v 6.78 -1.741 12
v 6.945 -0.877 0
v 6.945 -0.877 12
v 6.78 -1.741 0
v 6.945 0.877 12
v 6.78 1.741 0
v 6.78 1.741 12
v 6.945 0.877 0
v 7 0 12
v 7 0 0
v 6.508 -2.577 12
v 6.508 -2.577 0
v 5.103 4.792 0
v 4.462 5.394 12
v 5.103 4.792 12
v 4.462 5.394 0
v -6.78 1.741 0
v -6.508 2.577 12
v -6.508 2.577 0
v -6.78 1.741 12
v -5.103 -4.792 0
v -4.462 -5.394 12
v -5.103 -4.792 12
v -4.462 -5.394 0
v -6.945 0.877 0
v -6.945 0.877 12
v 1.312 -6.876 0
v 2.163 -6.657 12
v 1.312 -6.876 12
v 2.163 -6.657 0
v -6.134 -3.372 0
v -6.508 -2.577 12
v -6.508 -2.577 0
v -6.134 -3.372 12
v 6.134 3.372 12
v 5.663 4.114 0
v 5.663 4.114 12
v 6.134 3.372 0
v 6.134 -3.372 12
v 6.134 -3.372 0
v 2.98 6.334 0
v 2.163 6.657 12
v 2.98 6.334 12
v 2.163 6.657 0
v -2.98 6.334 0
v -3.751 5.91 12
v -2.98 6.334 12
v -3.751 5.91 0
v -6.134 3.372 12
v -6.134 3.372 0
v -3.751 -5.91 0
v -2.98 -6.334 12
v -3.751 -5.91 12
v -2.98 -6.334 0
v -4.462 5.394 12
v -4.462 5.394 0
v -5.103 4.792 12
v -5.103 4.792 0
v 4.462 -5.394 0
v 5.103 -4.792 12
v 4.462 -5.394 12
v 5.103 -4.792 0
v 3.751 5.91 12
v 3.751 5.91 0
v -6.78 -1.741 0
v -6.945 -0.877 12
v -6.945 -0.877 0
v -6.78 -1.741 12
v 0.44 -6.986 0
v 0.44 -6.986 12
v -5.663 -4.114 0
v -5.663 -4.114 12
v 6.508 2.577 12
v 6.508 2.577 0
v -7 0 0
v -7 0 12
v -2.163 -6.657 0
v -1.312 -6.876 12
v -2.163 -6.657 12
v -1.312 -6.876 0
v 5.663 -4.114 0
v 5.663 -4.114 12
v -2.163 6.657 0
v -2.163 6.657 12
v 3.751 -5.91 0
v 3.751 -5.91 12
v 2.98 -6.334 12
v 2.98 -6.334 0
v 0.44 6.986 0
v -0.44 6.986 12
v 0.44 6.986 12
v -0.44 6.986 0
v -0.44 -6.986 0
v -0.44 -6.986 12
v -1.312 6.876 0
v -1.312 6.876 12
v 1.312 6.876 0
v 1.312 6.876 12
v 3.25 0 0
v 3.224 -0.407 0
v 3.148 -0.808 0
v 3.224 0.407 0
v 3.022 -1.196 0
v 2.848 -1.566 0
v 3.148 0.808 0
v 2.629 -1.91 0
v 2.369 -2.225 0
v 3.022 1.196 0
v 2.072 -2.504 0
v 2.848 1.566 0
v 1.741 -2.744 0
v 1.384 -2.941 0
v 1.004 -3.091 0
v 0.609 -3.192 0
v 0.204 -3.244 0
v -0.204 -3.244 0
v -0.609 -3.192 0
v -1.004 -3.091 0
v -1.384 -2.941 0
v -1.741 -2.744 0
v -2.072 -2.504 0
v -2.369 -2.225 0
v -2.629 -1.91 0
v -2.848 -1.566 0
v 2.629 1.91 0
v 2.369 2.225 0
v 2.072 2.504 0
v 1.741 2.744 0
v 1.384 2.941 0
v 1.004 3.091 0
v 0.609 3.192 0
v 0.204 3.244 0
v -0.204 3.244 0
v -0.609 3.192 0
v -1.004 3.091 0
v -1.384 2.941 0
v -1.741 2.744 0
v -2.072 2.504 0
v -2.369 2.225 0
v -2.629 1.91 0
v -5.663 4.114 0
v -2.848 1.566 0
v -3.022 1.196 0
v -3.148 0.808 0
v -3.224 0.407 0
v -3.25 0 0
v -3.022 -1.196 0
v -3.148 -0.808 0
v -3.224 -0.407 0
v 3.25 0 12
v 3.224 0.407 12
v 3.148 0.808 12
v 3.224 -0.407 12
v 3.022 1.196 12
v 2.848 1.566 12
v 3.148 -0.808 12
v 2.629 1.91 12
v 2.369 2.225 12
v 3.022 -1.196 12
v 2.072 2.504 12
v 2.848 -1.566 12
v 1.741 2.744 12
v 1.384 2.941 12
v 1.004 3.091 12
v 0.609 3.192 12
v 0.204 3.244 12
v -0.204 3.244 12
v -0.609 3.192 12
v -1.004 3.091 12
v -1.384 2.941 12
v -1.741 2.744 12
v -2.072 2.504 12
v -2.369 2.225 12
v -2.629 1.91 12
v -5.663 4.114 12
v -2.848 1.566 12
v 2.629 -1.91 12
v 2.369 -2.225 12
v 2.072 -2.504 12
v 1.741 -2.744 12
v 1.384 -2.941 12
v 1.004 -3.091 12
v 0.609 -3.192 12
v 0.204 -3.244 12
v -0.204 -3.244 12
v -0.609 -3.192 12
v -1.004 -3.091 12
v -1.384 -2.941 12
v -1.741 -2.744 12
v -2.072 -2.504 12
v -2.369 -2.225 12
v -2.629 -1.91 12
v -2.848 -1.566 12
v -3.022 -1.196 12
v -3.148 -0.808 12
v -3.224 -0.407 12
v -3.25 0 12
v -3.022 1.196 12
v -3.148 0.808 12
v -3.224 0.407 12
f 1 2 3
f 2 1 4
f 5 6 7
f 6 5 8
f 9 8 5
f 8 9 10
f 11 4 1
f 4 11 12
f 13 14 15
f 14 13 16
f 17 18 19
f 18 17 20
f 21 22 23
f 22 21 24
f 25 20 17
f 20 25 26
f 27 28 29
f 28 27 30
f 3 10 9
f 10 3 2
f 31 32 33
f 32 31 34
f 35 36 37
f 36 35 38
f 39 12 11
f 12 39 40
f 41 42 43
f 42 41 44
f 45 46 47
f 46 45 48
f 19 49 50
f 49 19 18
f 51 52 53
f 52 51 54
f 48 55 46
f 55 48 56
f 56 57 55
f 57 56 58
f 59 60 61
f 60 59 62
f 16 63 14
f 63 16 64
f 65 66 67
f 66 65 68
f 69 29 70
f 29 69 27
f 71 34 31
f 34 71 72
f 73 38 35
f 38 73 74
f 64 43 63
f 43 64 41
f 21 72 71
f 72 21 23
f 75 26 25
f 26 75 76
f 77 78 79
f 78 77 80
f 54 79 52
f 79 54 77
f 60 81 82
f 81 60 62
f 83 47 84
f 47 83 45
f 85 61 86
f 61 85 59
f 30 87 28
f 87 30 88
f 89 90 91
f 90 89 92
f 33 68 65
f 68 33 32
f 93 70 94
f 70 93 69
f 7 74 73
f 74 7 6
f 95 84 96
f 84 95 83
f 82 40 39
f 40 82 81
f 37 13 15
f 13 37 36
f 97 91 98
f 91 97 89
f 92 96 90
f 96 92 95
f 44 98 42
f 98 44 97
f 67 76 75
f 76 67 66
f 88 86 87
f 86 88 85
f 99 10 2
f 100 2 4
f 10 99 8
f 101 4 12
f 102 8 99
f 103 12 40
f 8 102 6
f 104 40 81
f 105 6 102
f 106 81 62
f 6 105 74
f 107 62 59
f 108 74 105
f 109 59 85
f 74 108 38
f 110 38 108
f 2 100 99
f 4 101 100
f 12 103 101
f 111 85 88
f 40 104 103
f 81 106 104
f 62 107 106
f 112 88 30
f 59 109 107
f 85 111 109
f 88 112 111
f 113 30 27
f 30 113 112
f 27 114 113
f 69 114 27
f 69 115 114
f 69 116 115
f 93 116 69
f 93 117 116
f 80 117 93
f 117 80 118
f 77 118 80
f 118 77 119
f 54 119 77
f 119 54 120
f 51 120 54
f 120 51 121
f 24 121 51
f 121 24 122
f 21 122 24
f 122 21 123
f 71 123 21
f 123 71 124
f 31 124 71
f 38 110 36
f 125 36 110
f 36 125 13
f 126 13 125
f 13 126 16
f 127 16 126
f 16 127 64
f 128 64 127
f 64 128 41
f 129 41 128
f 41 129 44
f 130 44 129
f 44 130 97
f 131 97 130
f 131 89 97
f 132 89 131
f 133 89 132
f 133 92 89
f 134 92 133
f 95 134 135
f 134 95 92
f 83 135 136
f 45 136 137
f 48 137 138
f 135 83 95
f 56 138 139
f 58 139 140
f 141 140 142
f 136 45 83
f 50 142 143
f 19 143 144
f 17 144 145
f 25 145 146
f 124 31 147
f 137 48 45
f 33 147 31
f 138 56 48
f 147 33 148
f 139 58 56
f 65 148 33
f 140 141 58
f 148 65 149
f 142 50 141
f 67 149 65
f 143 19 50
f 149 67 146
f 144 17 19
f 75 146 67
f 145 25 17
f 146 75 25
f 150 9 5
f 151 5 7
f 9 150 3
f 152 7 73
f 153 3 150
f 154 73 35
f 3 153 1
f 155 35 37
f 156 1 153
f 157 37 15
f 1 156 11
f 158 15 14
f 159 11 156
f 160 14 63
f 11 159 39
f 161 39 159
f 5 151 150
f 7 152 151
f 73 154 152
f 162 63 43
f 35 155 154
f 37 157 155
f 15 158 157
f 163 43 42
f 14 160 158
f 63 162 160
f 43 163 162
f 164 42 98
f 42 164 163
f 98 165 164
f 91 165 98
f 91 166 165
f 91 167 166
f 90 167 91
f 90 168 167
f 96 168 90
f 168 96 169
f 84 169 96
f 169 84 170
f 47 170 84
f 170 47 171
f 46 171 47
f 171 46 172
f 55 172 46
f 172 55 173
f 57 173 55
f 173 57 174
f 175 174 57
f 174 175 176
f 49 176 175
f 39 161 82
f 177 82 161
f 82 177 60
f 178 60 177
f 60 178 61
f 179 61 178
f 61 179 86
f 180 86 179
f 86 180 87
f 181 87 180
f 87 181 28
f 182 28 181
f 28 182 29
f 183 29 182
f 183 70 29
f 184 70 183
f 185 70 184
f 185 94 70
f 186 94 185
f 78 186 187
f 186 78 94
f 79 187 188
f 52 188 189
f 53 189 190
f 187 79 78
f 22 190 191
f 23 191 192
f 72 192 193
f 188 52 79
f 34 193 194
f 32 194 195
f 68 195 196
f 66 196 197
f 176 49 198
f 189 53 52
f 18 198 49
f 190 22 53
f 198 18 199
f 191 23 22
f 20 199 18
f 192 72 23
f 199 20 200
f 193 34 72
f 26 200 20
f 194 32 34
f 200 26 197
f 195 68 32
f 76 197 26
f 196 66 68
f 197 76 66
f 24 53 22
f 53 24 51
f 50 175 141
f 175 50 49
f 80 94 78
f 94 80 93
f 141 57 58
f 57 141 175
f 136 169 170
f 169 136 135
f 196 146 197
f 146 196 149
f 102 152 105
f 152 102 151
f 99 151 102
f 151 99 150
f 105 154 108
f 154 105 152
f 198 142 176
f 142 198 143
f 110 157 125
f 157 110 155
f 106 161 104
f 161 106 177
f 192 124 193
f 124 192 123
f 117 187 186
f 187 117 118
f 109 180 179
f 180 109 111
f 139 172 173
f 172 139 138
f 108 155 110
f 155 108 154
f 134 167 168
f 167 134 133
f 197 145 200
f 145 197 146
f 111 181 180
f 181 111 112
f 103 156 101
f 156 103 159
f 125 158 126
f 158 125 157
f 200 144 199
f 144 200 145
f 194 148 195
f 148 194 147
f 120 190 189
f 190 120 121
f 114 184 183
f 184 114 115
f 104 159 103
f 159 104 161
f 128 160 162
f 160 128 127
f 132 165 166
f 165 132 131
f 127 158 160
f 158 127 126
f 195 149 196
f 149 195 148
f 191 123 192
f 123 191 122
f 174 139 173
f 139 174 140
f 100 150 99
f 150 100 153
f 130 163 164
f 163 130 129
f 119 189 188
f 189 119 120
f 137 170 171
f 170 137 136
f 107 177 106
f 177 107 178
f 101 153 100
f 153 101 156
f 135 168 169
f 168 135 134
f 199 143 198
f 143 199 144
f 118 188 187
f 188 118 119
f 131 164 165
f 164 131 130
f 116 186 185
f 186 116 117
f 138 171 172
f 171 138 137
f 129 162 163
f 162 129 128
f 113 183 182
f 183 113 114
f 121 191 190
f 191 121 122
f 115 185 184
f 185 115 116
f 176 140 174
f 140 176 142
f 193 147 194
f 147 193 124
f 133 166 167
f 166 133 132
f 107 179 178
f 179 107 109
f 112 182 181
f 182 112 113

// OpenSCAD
$fn = 50;


difference() {
	union() {
		cylinder(h = 12, r = 7.0000000000);
	}
	union() {
		translate(v = [0.0000000000, 0.0000000000, -100.0000000000]) {
			cylinder(h = 200, r = 3.2500000000);
		}
	}
}
